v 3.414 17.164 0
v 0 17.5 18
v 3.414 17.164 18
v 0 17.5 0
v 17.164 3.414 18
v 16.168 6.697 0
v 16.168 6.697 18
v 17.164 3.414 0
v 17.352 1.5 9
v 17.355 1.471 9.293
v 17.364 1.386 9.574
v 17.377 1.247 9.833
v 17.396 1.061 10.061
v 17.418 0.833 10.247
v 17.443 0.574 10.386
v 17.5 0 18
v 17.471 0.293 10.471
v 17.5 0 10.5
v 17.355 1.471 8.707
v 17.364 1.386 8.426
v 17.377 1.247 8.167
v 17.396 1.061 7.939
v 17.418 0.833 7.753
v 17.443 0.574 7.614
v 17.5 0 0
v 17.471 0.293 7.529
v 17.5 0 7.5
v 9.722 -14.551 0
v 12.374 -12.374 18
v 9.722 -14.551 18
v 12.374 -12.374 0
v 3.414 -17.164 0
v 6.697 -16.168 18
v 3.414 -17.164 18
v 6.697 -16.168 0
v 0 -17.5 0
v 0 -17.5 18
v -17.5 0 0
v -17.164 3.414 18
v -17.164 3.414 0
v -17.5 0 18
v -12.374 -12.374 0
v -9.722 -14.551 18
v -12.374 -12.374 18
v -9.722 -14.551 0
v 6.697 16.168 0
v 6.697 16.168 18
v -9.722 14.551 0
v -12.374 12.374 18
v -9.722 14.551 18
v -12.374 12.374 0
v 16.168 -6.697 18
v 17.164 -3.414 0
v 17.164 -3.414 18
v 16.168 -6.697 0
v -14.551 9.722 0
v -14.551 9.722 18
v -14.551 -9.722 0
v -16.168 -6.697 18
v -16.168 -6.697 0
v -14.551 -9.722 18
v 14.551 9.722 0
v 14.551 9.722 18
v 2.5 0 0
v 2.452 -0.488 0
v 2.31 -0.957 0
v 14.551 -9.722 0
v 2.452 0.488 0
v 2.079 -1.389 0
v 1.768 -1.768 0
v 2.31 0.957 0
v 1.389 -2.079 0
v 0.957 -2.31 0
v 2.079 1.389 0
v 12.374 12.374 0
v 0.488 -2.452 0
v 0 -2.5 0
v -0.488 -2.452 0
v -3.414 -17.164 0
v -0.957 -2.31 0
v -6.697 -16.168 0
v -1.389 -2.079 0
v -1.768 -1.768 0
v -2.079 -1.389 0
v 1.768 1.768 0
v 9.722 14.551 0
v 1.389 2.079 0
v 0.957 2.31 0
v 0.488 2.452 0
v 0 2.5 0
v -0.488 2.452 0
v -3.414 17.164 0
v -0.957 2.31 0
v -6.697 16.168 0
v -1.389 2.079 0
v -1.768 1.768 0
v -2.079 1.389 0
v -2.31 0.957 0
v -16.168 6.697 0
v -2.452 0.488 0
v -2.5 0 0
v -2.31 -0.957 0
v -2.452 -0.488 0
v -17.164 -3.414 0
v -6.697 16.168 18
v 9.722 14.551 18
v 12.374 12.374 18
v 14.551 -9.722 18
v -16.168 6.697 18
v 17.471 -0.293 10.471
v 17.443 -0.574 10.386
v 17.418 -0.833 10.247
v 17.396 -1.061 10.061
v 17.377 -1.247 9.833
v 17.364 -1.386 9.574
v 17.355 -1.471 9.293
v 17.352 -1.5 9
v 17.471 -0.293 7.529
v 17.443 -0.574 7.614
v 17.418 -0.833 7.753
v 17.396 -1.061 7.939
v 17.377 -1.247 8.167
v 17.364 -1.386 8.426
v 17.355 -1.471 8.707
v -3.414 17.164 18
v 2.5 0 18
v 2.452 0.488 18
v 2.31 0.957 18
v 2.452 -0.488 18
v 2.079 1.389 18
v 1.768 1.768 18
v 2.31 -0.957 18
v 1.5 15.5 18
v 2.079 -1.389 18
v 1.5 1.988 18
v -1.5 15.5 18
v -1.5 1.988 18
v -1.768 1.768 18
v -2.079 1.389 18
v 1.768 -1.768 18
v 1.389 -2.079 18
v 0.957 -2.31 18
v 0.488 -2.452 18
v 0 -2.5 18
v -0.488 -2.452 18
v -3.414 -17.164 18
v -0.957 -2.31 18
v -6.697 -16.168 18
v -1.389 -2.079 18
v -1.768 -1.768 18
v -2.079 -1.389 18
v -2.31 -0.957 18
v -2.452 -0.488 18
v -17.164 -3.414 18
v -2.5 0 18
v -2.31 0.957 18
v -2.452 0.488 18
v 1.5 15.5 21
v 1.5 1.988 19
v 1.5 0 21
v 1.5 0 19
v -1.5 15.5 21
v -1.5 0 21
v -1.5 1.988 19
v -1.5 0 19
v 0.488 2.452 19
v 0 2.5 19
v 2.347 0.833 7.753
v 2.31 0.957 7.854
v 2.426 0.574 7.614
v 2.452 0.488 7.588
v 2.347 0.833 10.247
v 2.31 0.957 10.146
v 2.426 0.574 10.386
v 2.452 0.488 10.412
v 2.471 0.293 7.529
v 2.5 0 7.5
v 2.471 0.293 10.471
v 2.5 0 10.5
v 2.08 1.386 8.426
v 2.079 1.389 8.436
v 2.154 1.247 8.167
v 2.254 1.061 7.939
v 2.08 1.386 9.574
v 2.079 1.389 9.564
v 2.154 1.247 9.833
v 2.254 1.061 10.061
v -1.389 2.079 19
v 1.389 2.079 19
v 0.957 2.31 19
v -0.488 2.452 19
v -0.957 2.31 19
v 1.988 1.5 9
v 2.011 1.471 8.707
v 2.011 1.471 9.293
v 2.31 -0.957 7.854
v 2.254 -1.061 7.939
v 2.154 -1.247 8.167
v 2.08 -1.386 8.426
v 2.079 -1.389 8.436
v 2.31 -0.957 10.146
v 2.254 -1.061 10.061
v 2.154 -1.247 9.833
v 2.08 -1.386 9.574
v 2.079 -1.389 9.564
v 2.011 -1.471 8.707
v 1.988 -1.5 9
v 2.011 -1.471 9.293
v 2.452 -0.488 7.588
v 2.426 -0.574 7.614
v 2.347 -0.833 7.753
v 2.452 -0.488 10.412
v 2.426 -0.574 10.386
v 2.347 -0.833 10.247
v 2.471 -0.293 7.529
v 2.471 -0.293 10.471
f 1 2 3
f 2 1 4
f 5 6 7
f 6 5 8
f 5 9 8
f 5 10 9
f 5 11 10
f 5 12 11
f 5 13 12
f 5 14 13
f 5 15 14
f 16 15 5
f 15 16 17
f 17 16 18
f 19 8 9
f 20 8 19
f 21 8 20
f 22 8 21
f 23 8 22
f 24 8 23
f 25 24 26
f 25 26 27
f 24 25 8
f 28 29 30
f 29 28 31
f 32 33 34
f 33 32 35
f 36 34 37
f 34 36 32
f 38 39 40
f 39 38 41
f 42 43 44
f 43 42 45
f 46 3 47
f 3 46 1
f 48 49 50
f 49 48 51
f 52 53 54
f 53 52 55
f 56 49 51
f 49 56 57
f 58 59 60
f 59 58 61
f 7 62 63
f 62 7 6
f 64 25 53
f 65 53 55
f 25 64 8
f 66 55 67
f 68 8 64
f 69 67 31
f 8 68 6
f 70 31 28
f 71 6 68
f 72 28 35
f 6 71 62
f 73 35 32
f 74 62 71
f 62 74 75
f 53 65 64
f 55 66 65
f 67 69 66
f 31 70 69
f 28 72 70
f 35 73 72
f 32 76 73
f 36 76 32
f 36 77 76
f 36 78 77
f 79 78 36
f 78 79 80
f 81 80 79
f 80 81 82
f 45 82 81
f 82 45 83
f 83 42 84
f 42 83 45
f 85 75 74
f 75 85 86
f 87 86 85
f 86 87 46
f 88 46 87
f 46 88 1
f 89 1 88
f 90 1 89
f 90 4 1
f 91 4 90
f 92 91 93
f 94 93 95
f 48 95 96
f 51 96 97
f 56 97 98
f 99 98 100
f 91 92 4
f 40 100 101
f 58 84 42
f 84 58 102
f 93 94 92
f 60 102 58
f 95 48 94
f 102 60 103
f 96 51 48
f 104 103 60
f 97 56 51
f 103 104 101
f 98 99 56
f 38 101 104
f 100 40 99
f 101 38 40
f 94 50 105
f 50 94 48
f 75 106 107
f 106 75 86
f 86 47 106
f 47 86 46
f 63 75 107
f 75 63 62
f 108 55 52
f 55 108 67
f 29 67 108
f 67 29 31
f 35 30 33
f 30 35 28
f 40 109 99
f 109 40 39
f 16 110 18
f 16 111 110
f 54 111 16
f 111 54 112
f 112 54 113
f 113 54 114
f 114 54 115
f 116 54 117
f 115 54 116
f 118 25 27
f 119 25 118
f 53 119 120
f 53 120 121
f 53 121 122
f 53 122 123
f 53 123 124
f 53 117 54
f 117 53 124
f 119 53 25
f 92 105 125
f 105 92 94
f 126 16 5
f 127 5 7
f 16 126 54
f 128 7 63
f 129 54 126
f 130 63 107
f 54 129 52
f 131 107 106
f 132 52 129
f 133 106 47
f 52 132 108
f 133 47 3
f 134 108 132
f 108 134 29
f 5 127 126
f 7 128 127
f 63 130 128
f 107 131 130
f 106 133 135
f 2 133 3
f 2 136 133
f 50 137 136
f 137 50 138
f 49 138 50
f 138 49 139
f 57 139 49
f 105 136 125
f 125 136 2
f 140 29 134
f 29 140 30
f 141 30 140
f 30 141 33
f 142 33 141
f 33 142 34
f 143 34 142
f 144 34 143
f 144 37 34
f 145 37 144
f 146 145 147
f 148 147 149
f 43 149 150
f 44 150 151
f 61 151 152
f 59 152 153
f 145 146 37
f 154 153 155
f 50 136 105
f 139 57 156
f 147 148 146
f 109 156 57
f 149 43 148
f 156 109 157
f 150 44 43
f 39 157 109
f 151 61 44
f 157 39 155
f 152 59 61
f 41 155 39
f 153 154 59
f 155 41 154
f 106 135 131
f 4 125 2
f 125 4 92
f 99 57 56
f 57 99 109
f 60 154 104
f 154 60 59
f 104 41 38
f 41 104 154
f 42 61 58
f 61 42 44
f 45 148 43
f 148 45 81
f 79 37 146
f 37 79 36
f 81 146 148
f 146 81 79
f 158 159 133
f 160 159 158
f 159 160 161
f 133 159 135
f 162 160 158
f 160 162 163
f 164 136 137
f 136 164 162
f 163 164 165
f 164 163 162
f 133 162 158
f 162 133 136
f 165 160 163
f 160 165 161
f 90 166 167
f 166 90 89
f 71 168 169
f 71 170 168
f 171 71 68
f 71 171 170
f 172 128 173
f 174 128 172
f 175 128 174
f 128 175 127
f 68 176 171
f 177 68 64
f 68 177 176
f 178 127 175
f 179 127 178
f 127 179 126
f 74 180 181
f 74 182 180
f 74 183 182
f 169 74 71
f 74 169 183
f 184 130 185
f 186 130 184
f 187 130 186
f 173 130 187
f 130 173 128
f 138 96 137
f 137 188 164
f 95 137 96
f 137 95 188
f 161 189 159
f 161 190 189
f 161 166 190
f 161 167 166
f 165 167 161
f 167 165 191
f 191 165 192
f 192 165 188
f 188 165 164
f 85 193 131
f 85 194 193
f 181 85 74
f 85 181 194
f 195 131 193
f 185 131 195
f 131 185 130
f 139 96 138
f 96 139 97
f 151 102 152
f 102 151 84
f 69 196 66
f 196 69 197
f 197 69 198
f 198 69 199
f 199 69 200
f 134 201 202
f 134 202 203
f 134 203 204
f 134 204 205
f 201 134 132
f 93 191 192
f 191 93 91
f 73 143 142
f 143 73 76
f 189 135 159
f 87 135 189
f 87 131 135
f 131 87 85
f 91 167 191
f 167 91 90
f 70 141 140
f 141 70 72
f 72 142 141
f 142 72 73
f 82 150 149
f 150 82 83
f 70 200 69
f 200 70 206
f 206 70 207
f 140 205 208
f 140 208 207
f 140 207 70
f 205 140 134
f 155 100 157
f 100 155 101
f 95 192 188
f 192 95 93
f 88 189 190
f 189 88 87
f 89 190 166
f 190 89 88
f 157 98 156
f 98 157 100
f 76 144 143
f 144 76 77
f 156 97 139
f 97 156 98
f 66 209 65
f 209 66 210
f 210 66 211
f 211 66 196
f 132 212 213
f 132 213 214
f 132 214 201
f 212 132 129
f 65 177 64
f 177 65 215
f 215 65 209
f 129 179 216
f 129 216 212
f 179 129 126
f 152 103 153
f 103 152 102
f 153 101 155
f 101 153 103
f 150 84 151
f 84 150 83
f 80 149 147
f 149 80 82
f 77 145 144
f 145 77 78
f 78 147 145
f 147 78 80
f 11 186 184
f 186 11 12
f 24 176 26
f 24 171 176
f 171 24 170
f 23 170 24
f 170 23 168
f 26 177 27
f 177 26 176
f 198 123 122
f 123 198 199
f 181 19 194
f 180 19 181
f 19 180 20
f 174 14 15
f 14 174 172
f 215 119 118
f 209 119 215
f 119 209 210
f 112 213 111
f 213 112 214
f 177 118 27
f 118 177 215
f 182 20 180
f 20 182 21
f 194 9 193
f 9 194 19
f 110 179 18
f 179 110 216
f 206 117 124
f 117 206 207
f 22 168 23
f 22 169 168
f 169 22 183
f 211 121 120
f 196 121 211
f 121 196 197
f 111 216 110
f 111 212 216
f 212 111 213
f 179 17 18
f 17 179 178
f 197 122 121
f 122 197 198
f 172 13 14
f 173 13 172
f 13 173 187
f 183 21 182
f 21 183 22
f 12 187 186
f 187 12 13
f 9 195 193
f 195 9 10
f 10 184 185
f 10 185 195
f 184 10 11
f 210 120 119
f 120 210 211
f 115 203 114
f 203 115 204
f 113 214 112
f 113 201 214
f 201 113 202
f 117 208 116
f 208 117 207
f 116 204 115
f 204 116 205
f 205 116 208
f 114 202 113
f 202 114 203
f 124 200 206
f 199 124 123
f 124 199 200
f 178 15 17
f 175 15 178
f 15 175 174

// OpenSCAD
$fn = 32;

// ----------------------------------------------------------------------
// Control knob: pointer knob
// ----------------------------------------------------------------------

// --- parameters (mm) ---
rib_w = 3;                // pointer rib width
rib_h = 4;                // pointer rib height
knob_d = 35;              // knob body diameter
knob_h = 18;              // knob body height
bore_d = 5;               // shaft bore diameter
set_d = 3;                // set screw bore diameter

rib_poke = rib_h - 1;  // rib height above the top
total_h = knob_h + rib_h - 1;  // overall height

difference() {
  union() {
    cylinder(h = knob_h, d = knob_d);
    translate([-rib_w / 2, 0, knob_h - 1])
      cube([rib_w, knob_d / 2 - 2, rib_h]);
  }
  translate([0, 0, -1]) cylinder(h = knob_h + 2, d = bore_d);
  translate([-1, 0, knob_h / 2]) rotate([0, 90, 0])
    cylinder(h = knob_d / 2 + bore_d / 2 + 2, d = set_d);}
